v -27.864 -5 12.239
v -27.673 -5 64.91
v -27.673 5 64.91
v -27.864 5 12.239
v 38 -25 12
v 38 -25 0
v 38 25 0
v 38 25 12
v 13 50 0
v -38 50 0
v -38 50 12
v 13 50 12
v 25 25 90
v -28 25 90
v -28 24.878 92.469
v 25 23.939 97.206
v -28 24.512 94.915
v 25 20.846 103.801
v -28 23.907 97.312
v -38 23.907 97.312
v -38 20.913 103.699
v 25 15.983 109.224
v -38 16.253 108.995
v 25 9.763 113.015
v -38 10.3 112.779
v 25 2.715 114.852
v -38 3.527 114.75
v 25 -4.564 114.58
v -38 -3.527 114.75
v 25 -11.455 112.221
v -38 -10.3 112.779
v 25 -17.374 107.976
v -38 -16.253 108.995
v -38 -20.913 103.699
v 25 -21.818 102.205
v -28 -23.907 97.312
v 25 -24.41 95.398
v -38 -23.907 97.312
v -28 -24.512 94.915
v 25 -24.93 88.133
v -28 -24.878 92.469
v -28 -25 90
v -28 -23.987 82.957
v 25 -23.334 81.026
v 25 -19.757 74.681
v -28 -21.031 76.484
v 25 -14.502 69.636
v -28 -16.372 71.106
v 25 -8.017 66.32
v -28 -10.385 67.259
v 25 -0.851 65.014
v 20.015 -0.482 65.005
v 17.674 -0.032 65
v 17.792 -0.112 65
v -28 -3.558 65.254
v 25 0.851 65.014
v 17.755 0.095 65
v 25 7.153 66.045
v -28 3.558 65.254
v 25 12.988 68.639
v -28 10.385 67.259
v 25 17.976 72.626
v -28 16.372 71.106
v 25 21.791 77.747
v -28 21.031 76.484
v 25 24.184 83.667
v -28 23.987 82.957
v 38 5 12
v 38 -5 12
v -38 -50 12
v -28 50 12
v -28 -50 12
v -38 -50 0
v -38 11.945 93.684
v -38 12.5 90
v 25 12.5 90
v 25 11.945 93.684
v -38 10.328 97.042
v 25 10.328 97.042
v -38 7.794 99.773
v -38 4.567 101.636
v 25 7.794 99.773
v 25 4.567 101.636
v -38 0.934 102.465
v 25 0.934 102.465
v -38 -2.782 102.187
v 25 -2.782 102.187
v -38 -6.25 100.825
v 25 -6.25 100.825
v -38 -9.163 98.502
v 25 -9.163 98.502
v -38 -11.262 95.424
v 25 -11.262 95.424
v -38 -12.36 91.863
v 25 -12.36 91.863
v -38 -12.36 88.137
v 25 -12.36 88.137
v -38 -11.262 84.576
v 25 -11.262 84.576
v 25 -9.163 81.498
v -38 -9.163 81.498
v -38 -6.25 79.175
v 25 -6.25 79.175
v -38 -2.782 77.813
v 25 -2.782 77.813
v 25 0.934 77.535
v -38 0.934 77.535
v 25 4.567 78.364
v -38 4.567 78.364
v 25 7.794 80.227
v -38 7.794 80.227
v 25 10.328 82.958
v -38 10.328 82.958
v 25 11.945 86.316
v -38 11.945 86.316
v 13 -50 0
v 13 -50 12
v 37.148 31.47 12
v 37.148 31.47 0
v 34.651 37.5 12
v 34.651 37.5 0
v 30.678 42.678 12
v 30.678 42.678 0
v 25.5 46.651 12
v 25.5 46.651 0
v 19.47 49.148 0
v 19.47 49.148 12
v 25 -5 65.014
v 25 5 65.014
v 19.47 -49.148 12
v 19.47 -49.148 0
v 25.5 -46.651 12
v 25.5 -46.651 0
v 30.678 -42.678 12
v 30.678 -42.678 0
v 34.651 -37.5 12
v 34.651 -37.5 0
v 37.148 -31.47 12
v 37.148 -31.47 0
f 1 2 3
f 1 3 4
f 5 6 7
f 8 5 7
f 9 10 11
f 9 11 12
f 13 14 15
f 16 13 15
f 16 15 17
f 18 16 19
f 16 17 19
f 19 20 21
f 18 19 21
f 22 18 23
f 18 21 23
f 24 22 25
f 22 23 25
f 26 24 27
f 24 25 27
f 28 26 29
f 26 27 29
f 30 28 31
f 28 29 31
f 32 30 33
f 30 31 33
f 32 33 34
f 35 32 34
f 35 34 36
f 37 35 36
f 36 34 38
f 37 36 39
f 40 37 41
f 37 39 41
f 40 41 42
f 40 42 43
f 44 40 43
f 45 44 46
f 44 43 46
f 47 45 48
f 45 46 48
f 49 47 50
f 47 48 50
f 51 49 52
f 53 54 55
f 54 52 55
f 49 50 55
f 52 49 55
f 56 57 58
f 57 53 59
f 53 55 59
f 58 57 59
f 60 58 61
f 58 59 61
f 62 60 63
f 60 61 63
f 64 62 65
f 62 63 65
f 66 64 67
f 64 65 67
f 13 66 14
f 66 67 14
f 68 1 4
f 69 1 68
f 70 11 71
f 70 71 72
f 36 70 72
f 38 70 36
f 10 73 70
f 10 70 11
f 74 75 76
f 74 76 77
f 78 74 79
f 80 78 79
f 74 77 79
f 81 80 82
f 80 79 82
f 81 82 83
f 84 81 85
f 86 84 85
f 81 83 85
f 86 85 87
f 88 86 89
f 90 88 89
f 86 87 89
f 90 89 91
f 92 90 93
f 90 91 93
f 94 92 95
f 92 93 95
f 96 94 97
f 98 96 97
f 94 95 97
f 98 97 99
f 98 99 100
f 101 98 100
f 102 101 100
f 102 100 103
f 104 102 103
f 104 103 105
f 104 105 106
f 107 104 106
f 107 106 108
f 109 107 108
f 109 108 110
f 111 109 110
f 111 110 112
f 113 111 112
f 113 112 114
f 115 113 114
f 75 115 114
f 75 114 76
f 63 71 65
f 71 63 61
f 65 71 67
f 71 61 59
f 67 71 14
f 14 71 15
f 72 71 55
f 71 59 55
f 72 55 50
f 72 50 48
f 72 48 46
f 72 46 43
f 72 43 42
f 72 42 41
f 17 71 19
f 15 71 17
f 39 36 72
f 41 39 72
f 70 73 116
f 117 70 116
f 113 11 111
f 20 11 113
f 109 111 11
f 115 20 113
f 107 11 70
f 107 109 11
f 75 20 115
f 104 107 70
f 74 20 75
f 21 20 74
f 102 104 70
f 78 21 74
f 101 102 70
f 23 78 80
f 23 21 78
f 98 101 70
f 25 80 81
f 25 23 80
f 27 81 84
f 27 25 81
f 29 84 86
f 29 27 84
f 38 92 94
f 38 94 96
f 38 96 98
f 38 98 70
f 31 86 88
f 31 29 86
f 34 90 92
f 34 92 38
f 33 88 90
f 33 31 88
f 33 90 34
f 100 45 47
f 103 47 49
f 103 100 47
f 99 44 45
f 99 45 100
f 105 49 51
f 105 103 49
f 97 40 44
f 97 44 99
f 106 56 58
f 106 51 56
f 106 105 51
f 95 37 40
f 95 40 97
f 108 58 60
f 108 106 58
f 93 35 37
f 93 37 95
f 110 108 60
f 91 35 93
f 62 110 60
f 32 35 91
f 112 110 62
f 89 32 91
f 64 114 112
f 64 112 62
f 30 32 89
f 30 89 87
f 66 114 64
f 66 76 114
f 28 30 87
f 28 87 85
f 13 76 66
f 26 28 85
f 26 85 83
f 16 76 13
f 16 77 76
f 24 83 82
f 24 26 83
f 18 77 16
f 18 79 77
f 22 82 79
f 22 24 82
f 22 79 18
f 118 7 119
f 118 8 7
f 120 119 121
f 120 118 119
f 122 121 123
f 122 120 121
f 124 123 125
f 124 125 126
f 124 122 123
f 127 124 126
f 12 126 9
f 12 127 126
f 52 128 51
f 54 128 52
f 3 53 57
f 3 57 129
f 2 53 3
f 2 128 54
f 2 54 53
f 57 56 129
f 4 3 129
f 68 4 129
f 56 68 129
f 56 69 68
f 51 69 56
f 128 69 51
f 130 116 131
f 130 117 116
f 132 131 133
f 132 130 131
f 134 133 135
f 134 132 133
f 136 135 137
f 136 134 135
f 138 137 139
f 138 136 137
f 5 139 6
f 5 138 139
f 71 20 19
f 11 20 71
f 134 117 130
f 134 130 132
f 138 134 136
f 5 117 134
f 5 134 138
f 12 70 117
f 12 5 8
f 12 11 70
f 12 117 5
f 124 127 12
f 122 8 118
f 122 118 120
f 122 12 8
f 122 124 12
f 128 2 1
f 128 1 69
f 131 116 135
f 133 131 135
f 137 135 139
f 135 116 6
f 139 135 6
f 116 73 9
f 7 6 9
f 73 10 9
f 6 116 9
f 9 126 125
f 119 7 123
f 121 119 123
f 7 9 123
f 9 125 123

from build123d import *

# Parameters (mm, degrees)
F0_W      = 76
F0_H      = 100
F1_DEPTH  = 12
F2_R      = 25
F3_R      = 25
F4_DEPTH  = 25
F5_R      = 12.5
F6_DEPTH  = 63
F7_DEPTH  = 63
F8_R      = 12.5
F9_DEPTH  = 63.001
F11_DEPTH = 10
F13_DEPTH = 5


with BuildPart() as f1:
    # F0 (on Top) → F1 (new body)
    with BuildSketch(Plane.XY):
        Rectangle(F0_W, F0_H)
    extrude(amount=F1_DEPTH)

    # F2
    f2_edges = [f1.edges().sort_by_distance(p)[0] for p in [
        (38, -50, 6),
        (38, 50, 6),
    ]]
    fillet(f2_edges, radius=F2_R)

    # F5 (on face) → F6 (cut)
    with BuildSketch(Plane.YZ.offset(25)):
        with Locations((0, 90)):
            Circle(F5_R)
    extrude(amount=F6_DEPTH, mode=Mode.SUBTRACT)


with BuildPart() as f4:
    # F3 (on Right) → F4 (new body)
    with BuildSketch(Plane.YZ):
        with Locations((0, 90)):
            Circle(F3_R)
    extrude(amount=F4_DEPTH)

    # F7 (add): a face of the model
    f7_faces = [f4.faces().sort_by_distance(p)[0] for p in [
        (25, 0, 90),
    ]]
    extrude(f7_faces, amount=-F7_DEPTH)

    # F8 (on face) → F9 (cut, through all)
    with BuildSketch(Plane.YZ.offset(25)):
        with Locations((0, 90)):
            Circle(F8_R)
    extrude(amount=-F9_DEPTH, mode=Mode.SUBTRACT)

    # F10 (on face) → F11 (join)
    with BuildSketch(Plane(origin=(-38, 0, 0), x_dir=(0, -1, 0), z_dir=(-1, 0, 0))):
        with BuildLine():
            ThreePointArc((25, 90), (-3.6966549694, 65.2748156319), (-23.906779363, 97.3120380532))
            Line((-23.906779363, 97.3120380532), (-50, 12))
            Line((-50, 12), (50, 12))
            Line((50, 12), (23.906779363, 97.3120380532))
            ThreePointArc((23.906779363, 97.3120380532), (24.7251843681, 93.6966549694), (25, 90))
        make_face()
    extrude(amount=-F11_DEPTH)

    # F12 (on Front) → F13 (join, symmetric)
    with BuildSketch(Plane.XZ):
        Polygon((38, 12), (25, 65.0144964457), (-27.6728401392, 64.9104069279), (-27.8638396412, 12.2388377786), align=None)
    extrude(amount=F13_DEPTH, both=True)


solid = Compound([f1.part, f4.part])
